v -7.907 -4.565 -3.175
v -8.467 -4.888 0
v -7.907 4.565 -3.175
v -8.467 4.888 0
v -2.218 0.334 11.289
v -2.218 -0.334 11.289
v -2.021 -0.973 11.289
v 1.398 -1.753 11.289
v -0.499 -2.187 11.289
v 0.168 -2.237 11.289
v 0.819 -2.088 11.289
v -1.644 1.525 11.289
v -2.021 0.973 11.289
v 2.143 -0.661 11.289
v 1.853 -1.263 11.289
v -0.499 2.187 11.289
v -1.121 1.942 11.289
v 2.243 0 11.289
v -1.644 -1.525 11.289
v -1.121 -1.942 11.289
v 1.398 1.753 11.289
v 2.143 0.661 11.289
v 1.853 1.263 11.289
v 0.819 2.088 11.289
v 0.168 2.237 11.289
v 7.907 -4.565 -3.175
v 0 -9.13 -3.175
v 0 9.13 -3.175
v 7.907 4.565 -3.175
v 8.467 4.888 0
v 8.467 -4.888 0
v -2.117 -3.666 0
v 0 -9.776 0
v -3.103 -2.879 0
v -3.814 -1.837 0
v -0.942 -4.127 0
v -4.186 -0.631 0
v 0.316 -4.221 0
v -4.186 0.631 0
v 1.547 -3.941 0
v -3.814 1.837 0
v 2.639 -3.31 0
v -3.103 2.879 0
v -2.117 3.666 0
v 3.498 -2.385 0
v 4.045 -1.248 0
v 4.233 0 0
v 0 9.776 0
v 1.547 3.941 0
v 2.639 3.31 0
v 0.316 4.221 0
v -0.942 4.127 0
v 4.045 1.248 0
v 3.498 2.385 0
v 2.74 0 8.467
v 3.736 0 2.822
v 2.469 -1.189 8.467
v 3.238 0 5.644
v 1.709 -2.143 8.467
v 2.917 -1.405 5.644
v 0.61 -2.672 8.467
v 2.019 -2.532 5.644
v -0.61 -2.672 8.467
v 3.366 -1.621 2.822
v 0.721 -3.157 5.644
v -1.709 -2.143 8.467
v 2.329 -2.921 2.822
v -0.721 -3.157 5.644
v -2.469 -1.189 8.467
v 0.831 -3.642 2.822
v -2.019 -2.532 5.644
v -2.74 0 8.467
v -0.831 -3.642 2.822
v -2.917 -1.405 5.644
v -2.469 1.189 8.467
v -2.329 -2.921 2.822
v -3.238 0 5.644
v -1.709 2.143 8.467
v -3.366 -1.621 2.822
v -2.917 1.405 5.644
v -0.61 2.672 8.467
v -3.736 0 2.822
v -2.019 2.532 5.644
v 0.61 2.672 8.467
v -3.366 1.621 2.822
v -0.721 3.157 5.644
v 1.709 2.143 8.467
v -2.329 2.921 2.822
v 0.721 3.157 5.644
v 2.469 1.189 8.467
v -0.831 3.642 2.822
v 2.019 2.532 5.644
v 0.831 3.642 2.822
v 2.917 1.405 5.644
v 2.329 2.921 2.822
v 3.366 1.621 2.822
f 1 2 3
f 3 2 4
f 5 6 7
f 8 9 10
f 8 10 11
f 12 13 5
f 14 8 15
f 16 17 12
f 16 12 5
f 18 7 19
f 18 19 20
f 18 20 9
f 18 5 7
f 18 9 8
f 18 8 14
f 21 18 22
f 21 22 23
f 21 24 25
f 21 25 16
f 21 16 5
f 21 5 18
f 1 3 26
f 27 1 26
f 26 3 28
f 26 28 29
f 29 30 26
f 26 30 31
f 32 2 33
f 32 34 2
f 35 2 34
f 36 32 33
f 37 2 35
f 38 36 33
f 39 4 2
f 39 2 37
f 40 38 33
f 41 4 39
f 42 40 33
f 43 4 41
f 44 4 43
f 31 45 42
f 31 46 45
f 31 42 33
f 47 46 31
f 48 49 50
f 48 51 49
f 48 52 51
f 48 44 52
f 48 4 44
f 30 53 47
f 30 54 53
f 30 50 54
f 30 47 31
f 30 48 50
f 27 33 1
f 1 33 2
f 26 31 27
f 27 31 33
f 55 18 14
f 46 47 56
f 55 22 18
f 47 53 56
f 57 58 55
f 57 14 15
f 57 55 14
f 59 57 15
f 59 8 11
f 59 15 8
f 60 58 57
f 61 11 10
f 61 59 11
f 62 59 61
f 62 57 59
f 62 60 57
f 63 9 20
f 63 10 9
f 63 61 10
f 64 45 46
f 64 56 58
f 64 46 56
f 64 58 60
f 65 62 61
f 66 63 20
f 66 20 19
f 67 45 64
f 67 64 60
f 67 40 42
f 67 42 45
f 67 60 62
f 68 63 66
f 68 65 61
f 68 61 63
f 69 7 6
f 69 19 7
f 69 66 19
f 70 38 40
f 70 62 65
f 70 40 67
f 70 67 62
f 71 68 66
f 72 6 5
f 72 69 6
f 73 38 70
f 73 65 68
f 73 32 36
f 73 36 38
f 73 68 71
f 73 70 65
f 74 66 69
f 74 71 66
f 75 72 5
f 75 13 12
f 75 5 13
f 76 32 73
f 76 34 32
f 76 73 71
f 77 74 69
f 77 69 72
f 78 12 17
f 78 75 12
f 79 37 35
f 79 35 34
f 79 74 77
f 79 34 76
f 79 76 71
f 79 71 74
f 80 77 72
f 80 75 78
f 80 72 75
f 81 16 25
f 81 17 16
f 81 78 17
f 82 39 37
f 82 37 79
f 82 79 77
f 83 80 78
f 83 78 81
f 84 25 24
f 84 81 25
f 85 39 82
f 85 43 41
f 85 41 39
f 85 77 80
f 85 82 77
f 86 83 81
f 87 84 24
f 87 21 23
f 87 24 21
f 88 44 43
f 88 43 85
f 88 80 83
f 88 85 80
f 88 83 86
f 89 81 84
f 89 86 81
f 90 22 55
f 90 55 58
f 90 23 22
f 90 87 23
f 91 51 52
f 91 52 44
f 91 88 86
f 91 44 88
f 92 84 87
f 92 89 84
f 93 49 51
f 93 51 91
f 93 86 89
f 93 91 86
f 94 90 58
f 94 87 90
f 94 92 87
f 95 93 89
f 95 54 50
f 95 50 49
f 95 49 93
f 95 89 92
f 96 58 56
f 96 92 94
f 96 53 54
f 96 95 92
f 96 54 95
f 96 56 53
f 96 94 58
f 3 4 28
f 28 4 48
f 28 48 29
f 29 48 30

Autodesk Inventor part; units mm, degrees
ref_plane "YZ Plane" through (0, 0, 0) normal (1, 0, 0) x (0, 1, 0)
ref_plane "XZ Plane" through (0, 0, 0) normal (0, 1, 0) x (-1, 0, 0)
ref_plane "XY Plane" through (0, 0, 0) normal (0, 0, 1) x (1, 0, 0)
sketch "Sketch1" plane through (0, 0, 0) normal (0, 0, 1) x (1, 0, 0)
  line L0 (5.644444, -5.644444) -> (-5.644444, -5.644444)
  line L1 (-5.644444, -5.644444) -> (-5.644444, 5.644444)
  line L2 (-5.644444, 5.644444) -> (5.644444, 5.644444)
  line L3 (5.644444, 5.644444) -> (5.644444, -5.644444)
  point P0 (0, 0)
  point P1 (0, 0)
  dimension "d0" = 11.28889
extrude "Extrusion1" add sketch "Sketch1" along normal blind 8.466667
ref_plane "Work Plane1" through (0, 5.644444, 8.466667) normal (-1, 0, 0) x (0, -1, 0)
sketch "Sketch2" plane through (0, 5.644444, 8.466667) normal (-1, 0, 0) x (0, -1, 0)
  line L0 (5.644444, -8.466667) -> (-2.822222, -8.466667)
  line L1 (0, -8.466667) -> (11.288889, -8.466667)
  line L2 (5.644444, -8.466667) -> (5.644444, -11.641667)
  arc A0 (-2.822222, -8.466667) -> (5.644444, -11.641667) centre (5.644444, 1.234722) ccw
  dimension "d3" = 8.46667
  dimension "d4" = 3.175
revolve "Revolution1" add sketch "Sketch2" angle 360 about axis through (0, 0, 0) along (0, 0, -1)
sketch "Sketch3" plane through (0, 0, 8.466667) normal (0, 0, 1) x (1, 0, 0)
  line L0 (-5.644444, -5.644444) -> (5.644444, -5.644444)
  line L1 (5.644444, -5.644444) -> (5.644444, 5.644444)
  line L2 (5.644444, 5.644444) -> (-5.644444, 5.644444)
  line L3 (-5.644444, 5.644444) -> (-5.644444, -5.644444)
  point P0 (0, 0)
extrude "Extrusion2" cut sketch "Sketch3" against normal up to surface (8.466667 mm away)
sketch "Sketch4" plane through (0, 0, 0) normal (0, 0, 1) x (1, 0, 0)
  circle A0 centre (0, 0) radius 4.233333
  dimension "d8" = 8.46667
extrude "Extrusion3" add sketch "Sketch4" along normal blind 11.288889 draft -10
sketch "Sketch5" plane through (0, 0, 0) normal (0, 0, 1) x (1, 0, 0)
  circle A0 centre (0, 0) radius 8.466667
  line L0 (8.466667, -4.888232) -> (0, -9.776465)
  line L1 (0, -9.776465) -> (-8.466667, -4.888232)
  line L2 (-8.466667, -4.888232) -> (-8.466667, 4.888232)
  line L3 (-8.466667, 4.888232) -> (0, 9.776465)
  line L4 (0, 9.776465) -> (8.466667, 4.888232)
  line L5 (8.466667, 4.888232) -> (8.466667, -4.888232)
  point P0 (0, 0)
  point P1 (0, 0)
  point P2 (8.466667, 0)
sketch "Sketch5 outline for Extrusion4" plane through (0, 0, 0) normal (0, 0, 1) x (1, 0, 0)
  line L0 (8.466667, 0) -> (8.466667, -4.888232)
  line L1 (8.466667, -4.888232) -> (0, -9.776465)
  line L2 (0, -9.776465) -> (-8.466667, -4.888232)
  line L3 (-8.466667, -4.888232) -> (-8.466667, 4.888232)
  line L4 (-8.466667, 4.888232) -> (0, 9.776465)
  line L5 (0, 9.776465) -> (8.466667, 4.888232)
  line L6 (8.466667, 4.888232) -> (8.466667, 0)
extrude "Extrusion4" add sketch "Sketch5 outline for Extrusion4" against normal blind 3.175 draft -10
properties part number "Driver Shaft Cap"
